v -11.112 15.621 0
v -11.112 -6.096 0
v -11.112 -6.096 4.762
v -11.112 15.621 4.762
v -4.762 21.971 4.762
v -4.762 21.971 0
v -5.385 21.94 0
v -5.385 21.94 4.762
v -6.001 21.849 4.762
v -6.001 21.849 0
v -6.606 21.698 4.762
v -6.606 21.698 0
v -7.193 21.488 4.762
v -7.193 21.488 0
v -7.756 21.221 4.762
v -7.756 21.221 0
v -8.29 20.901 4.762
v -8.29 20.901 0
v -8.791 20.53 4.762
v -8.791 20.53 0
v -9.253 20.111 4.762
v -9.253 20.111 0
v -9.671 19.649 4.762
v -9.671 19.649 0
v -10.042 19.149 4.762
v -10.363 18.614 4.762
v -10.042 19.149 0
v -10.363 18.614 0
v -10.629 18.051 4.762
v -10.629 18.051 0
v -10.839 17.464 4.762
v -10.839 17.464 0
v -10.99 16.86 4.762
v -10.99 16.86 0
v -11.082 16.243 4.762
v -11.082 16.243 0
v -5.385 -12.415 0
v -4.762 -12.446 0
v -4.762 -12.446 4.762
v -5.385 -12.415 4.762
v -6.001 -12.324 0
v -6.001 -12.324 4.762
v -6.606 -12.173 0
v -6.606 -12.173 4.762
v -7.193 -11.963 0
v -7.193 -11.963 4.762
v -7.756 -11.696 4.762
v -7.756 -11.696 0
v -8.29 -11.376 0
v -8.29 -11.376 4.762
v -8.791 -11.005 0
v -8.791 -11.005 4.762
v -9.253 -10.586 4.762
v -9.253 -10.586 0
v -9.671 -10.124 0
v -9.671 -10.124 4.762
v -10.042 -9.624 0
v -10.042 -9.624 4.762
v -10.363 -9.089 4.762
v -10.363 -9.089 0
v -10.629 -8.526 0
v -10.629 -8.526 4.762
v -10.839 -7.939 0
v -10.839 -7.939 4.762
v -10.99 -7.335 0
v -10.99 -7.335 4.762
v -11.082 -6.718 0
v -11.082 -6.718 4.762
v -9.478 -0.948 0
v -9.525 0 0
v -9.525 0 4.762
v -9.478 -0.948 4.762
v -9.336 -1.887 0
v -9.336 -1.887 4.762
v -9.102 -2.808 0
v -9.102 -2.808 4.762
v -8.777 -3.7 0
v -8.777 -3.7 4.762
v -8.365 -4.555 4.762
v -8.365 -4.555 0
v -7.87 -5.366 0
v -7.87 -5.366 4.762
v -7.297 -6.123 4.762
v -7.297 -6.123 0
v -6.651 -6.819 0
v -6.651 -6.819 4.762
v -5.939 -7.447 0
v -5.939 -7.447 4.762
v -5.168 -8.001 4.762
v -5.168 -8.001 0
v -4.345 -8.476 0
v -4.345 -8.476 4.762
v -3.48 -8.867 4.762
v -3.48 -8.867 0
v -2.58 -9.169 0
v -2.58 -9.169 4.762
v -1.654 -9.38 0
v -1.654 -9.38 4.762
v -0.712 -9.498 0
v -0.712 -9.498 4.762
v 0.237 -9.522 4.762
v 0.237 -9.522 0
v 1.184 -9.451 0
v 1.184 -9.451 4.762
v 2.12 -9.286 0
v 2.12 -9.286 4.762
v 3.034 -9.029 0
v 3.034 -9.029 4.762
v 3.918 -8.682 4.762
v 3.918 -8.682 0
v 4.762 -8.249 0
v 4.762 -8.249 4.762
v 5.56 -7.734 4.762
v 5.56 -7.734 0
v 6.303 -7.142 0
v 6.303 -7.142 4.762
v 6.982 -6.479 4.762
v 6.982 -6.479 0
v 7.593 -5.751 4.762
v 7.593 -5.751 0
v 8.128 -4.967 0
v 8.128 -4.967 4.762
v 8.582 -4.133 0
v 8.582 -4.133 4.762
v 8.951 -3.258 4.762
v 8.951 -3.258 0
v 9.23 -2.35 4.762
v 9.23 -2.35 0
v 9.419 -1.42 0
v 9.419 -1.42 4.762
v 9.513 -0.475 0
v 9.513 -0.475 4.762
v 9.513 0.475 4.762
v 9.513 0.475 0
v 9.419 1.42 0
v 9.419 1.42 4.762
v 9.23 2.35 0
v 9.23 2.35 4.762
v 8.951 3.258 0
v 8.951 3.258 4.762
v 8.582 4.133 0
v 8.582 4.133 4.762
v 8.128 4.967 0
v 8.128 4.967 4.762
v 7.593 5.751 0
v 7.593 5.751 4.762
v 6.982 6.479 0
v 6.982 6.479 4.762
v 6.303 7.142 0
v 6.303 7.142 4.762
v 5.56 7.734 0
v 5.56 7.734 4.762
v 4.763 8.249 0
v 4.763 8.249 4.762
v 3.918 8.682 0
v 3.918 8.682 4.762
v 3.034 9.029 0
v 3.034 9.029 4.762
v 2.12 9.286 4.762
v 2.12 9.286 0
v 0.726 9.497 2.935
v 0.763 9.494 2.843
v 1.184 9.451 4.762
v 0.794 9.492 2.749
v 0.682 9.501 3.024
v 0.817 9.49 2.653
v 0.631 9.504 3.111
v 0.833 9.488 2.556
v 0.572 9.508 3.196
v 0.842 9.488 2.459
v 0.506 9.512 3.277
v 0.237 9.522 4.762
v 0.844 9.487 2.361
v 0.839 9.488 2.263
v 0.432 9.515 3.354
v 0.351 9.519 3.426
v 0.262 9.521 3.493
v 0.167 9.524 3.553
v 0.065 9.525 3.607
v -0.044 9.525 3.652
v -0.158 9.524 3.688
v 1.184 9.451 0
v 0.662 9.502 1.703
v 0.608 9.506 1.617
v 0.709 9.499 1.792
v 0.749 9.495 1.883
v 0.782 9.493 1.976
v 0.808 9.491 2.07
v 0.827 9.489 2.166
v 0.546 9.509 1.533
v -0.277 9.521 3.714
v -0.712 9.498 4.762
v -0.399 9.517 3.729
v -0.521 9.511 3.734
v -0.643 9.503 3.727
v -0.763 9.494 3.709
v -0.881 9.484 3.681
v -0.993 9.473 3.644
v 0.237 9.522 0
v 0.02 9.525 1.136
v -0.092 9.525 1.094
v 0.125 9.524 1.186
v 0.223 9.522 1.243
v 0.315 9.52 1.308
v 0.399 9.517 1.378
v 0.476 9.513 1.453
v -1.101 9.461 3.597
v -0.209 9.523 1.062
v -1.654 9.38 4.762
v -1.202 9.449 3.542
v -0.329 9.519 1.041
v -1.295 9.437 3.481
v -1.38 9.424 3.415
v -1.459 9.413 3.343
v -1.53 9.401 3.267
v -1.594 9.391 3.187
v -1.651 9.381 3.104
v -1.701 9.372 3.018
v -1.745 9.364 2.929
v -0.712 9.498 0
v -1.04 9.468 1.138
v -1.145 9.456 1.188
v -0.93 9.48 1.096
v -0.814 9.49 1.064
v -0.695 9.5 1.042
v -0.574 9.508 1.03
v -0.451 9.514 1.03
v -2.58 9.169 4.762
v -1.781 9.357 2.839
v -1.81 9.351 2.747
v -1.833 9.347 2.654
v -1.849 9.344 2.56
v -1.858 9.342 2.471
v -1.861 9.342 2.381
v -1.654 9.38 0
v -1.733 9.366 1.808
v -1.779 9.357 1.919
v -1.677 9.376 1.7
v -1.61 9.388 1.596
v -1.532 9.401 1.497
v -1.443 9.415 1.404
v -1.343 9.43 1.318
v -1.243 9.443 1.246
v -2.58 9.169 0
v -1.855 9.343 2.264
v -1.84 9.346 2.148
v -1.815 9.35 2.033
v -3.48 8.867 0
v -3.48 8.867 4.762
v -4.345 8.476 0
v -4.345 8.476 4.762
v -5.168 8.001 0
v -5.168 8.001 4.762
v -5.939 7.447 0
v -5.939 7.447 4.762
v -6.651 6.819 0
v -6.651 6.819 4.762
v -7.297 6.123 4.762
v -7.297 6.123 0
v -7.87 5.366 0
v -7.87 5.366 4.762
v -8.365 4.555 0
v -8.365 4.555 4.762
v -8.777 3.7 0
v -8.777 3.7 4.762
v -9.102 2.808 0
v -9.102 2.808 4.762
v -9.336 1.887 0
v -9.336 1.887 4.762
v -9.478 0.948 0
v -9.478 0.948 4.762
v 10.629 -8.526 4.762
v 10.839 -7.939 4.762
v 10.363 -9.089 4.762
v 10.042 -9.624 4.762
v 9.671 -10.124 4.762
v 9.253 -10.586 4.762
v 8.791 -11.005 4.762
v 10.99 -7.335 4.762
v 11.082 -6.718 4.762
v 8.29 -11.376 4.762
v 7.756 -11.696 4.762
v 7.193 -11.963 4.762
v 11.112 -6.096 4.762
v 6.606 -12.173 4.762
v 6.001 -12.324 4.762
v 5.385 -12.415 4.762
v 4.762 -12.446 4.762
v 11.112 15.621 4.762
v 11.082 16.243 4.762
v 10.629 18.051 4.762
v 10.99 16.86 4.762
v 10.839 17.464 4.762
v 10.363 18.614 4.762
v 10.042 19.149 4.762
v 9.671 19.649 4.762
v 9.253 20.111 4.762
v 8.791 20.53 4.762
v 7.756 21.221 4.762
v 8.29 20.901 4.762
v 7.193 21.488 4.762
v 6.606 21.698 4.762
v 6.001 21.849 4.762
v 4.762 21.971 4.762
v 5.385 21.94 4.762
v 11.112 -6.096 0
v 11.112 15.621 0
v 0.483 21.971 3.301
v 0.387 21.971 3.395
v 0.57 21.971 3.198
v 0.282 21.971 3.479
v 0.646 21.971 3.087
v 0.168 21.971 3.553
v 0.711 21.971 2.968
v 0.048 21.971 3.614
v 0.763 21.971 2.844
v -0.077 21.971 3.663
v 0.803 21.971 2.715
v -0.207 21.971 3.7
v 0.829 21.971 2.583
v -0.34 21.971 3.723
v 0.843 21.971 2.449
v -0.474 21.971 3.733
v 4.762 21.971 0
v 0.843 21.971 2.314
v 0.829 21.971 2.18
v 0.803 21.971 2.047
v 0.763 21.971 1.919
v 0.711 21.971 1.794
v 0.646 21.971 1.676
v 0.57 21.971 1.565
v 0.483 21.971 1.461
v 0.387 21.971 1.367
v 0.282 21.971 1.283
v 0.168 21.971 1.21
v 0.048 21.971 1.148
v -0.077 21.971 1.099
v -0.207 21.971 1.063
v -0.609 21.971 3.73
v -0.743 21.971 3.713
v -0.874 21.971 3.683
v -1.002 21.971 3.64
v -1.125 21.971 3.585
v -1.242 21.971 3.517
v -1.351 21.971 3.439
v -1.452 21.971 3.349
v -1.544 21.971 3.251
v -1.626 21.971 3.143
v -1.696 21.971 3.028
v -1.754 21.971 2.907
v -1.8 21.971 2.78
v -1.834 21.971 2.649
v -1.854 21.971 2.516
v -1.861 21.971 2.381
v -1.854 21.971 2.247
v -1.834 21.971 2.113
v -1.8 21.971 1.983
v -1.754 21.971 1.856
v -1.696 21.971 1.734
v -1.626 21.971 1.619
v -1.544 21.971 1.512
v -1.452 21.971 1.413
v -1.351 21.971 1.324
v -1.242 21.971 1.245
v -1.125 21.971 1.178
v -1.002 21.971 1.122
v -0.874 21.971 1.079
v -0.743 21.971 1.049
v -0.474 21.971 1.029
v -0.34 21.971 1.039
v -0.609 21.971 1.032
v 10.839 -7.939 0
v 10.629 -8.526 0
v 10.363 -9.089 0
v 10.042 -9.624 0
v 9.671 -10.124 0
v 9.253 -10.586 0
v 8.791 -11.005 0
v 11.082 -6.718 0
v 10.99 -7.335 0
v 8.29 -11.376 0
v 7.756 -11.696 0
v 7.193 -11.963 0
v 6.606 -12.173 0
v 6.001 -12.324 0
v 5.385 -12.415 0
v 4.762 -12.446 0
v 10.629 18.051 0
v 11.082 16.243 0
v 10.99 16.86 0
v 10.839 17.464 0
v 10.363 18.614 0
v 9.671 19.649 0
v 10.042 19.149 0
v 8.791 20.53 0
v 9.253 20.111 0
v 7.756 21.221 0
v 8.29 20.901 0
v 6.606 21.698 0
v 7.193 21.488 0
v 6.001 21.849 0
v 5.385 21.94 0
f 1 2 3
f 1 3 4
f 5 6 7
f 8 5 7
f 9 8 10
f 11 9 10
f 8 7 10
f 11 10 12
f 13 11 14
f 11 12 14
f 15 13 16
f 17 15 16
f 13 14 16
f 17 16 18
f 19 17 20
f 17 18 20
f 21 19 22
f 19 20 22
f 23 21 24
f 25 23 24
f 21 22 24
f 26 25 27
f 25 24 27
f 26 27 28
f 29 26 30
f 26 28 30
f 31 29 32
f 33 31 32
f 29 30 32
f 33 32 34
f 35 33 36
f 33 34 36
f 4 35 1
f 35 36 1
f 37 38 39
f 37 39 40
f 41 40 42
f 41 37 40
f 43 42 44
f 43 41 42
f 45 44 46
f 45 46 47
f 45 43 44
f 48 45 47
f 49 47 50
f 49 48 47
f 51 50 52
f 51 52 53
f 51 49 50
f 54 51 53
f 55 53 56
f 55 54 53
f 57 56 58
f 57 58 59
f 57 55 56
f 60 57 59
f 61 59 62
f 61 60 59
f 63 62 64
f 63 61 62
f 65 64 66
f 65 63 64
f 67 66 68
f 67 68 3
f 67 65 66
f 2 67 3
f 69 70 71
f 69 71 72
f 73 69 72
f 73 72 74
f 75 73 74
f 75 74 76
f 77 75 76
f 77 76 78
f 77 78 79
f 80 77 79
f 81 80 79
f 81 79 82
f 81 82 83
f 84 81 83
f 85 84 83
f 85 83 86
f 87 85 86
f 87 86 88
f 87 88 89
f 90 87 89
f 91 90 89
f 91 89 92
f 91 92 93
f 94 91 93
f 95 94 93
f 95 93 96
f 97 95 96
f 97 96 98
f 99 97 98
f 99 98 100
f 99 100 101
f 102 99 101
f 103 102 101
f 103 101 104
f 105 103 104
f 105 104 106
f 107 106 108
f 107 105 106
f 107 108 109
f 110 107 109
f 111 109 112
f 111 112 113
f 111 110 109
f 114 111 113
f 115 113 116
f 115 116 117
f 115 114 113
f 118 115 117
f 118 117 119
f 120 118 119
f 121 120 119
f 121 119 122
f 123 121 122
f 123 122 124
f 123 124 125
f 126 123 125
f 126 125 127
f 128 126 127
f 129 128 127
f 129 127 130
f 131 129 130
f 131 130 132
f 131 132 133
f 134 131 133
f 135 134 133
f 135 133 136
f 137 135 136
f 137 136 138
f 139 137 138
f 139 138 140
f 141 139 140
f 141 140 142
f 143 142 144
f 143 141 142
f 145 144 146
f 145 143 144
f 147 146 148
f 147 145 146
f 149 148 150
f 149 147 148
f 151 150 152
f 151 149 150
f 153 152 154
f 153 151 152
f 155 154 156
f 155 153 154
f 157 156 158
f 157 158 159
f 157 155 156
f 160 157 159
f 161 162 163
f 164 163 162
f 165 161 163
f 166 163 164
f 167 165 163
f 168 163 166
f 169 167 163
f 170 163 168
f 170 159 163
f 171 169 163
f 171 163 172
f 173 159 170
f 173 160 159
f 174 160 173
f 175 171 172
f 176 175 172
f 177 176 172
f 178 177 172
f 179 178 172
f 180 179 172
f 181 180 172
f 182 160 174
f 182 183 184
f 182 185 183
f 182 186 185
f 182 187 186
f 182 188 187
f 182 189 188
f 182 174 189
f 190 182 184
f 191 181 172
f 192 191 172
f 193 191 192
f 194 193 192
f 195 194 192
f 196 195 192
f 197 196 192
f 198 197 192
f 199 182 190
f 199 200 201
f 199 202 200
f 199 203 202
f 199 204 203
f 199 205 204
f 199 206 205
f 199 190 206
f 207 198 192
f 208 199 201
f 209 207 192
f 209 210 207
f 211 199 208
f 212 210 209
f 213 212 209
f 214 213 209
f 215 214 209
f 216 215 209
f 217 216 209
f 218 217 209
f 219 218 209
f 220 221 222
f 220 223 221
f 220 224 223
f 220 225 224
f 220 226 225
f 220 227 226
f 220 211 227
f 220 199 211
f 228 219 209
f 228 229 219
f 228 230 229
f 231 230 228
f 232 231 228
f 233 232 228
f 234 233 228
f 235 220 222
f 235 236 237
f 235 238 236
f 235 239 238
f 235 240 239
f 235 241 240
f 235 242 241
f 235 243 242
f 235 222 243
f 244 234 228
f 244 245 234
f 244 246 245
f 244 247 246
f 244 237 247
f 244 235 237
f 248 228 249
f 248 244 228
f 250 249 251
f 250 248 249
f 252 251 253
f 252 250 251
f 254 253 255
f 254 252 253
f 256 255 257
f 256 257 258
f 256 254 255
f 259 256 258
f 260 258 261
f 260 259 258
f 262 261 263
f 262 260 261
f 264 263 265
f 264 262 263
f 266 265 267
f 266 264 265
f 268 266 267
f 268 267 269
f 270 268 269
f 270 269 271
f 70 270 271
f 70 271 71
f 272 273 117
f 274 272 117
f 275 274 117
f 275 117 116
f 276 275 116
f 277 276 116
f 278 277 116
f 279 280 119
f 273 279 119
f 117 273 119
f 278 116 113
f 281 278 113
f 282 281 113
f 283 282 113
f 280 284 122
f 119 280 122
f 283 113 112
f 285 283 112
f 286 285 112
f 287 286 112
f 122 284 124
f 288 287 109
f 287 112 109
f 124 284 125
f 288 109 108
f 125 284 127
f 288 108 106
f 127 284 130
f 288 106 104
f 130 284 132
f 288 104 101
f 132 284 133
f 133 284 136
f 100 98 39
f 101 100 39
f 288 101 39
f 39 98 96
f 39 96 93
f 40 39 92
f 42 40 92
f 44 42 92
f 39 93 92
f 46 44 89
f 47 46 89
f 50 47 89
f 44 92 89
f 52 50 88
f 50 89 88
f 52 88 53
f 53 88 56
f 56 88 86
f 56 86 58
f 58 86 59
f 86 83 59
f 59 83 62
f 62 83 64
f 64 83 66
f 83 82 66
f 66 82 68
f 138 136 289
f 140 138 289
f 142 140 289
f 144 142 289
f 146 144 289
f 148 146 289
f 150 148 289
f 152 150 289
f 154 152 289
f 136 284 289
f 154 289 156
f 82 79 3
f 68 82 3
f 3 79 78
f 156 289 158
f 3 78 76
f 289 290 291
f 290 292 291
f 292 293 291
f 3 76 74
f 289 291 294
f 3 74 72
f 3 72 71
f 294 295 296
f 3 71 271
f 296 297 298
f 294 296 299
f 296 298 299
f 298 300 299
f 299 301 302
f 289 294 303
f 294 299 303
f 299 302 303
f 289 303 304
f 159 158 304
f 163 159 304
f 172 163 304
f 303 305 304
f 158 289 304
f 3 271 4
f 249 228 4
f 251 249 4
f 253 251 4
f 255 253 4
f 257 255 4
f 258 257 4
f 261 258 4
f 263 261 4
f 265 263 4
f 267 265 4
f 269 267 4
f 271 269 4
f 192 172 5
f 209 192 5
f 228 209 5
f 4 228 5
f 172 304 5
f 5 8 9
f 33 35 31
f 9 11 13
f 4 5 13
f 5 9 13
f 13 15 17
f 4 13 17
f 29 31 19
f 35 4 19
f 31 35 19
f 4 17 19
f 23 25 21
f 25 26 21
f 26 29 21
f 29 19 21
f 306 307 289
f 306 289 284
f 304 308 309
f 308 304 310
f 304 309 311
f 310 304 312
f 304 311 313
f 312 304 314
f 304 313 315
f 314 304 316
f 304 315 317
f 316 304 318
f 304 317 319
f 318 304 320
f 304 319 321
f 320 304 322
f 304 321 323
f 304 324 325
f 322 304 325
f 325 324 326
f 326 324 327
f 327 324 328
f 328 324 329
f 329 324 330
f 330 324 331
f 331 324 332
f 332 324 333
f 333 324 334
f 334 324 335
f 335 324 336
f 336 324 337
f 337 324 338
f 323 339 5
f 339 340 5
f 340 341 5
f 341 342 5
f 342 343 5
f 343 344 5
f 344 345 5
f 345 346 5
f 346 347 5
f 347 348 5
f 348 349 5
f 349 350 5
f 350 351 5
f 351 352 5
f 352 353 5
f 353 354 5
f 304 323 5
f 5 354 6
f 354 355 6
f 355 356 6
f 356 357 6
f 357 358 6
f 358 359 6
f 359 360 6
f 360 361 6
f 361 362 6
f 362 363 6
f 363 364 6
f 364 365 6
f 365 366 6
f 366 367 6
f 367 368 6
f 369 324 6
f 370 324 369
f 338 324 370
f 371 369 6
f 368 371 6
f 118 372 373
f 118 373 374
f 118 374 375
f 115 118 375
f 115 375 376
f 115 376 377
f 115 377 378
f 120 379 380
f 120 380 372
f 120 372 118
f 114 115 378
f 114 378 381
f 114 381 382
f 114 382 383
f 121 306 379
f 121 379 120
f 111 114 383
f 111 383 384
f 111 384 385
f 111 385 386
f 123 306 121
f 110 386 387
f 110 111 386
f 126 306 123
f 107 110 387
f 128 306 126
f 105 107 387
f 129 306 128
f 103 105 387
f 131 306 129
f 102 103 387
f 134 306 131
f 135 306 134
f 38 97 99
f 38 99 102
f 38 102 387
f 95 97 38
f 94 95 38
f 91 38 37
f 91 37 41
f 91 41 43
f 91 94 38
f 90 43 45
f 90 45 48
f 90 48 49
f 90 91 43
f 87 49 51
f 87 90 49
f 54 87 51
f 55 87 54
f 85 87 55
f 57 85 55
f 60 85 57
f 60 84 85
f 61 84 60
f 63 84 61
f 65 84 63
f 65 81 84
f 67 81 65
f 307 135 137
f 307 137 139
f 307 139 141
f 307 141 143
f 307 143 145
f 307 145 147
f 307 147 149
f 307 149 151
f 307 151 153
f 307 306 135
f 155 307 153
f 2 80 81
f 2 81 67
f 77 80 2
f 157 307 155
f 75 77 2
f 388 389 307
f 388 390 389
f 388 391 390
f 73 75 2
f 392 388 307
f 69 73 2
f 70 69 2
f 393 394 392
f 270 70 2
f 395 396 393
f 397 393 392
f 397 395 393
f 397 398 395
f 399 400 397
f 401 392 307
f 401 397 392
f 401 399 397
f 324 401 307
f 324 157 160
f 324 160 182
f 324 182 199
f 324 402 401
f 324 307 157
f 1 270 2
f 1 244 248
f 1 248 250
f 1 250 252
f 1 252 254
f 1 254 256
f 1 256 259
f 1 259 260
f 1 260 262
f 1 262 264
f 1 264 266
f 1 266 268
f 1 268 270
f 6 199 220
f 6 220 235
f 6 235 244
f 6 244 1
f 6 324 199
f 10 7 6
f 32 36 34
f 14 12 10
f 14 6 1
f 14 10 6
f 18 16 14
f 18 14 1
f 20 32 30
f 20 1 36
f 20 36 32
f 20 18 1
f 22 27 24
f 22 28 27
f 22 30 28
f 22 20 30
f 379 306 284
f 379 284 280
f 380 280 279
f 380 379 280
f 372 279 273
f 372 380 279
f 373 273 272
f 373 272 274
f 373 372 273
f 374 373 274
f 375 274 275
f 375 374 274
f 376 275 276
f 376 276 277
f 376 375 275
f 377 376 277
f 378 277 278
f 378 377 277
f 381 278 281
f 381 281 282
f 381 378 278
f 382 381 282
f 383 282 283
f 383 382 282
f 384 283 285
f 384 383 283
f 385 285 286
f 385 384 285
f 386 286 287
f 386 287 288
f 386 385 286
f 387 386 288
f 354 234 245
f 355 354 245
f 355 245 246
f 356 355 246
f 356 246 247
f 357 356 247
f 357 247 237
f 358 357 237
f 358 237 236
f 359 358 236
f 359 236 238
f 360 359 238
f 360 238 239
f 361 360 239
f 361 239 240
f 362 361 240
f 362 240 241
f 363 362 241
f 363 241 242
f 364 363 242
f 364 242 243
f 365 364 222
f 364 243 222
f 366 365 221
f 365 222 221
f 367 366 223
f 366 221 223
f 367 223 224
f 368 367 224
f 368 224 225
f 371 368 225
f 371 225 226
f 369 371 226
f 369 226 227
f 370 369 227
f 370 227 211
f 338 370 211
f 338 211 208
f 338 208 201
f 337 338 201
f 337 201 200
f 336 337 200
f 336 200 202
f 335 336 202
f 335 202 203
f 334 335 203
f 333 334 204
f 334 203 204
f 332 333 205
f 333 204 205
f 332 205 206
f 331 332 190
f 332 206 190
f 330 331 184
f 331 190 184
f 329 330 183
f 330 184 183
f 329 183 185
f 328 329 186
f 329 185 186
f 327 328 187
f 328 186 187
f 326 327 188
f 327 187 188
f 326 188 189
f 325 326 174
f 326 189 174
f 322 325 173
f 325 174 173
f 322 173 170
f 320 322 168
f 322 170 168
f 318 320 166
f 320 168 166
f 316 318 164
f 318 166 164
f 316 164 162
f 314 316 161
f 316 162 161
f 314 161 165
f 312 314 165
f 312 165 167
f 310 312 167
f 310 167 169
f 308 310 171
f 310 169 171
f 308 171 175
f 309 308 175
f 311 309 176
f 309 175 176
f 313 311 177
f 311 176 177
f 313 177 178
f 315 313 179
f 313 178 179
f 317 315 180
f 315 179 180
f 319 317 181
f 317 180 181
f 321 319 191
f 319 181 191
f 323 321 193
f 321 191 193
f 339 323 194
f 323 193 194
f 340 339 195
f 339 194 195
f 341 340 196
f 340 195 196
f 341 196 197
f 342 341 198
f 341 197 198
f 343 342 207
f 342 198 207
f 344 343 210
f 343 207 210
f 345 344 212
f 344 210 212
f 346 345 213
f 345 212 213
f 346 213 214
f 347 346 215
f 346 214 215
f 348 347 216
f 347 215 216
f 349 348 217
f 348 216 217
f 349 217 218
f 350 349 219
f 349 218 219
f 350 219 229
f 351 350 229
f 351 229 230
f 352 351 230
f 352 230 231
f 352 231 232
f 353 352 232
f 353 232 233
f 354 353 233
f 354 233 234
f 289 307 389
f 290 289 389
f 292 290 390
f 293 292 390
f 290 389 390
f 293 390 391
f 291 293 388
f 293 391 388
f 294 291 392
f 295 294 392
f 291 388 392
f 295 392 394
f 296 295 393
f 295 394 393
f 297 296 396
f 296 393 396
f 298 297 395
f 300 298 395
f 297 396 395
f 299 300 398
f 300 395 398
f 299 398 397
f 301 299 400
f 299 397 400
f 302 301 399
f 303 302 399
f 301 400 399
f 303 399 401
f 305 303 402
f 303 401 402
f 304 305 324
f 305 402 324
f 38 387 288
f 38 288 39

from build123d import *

# Parameters (mm, degrees)
SKETCH1_R                     = 9.525
BOSS_EXTRUDE2_DEPTH           = 4.7625
TAP_DRILL_FOR_6_32_TAP1_D     = 2.7051
TAP_DRILL_FOR_6_32_TAP1_DEPTH = 19.05
TAP_DRILL_FOR_6_32_TAP1_TIP   = 0.81269403


with BuildPart() as part:
    # Sketch1 → Boss-Extrude2 (new body)
    # profile 1 of 2: a face of its own
    with BuildSketch(Plane.XY):
        with BuildLine():
            Line((4.7625, 21.971), (-4.7625, 21.971))
            ThreePointArc((-4.7625, 21.971), (-9.252628061, 20.111128061), (-11.1125, 15.621))
            Line((-11.1125, 15.621), (-11.1125, 12.446))
            Line((-11.1125, 12.446), (11.1125, 12.446))
            Line((11.1125, 12.446), (11.1125, 15.621))
            ThreePointArc((11.1125, 15.621), (9.252628061, 20.111128061), (4.7625, 21.971))
        make_face()
    # profile 2 of 2: a face of its own
    with BuildSketch(Plane.XY):
        with BuildLine():
            Line((4.7625, -12.446), (-4.7625, -12.446))
            ThreePointArc((-4.7625, -12.446), (-9.252628061, -10.586128061), (-11.1125, -6.096))
            Line((-11.1125, -6.096), (-11.1125, 12.446))
            Line((-11.1125, 12.446), (11.1125, 12.446))
            Line((11.1125, 12.446), (11.1125, -6.096))
            ThreePointArc((11.1125, -6.096), (9.252628061, -10.586128061), (4.7625, -12.446))
        make_face()
        with Locations(Location((0, 0, 0), (0, 0, 180))):
            Circle(SKETCH1_R, mode=Mode.SUBTRACT)
    extrude(amount=BOSS_EXTRUDE2_DEPTH)

    # Tap Drill for #6-32 Tap1
    with Locations(Plane(origin=(0, 21.971, 0), x_dir=(1, 0, 0), z_dir=(0, 1, 0))):
        with Locations((-0.508, -2.38125)):
            Hole(TAP_DRILL_FOR_6_32_TAP1_D / 2, depth=TAP_DRILL_FOR_6_32_TAP1_DEPTH)
            with Locations((0, 0, -(TAP_DRILL_FOR_6_32_TAP1_DEPTH + TAP_DRILL_FOR_6_32_TAP1_TIP / 2))):  # 118° drill point
                Cone(0, TAP_DRILL_FOR_6_32_TAP1_D / 2, TAP_DRILL_FOR_6_32_TAP1_TIP, mode=Mode.SUBTRACT)


solid = part.part
